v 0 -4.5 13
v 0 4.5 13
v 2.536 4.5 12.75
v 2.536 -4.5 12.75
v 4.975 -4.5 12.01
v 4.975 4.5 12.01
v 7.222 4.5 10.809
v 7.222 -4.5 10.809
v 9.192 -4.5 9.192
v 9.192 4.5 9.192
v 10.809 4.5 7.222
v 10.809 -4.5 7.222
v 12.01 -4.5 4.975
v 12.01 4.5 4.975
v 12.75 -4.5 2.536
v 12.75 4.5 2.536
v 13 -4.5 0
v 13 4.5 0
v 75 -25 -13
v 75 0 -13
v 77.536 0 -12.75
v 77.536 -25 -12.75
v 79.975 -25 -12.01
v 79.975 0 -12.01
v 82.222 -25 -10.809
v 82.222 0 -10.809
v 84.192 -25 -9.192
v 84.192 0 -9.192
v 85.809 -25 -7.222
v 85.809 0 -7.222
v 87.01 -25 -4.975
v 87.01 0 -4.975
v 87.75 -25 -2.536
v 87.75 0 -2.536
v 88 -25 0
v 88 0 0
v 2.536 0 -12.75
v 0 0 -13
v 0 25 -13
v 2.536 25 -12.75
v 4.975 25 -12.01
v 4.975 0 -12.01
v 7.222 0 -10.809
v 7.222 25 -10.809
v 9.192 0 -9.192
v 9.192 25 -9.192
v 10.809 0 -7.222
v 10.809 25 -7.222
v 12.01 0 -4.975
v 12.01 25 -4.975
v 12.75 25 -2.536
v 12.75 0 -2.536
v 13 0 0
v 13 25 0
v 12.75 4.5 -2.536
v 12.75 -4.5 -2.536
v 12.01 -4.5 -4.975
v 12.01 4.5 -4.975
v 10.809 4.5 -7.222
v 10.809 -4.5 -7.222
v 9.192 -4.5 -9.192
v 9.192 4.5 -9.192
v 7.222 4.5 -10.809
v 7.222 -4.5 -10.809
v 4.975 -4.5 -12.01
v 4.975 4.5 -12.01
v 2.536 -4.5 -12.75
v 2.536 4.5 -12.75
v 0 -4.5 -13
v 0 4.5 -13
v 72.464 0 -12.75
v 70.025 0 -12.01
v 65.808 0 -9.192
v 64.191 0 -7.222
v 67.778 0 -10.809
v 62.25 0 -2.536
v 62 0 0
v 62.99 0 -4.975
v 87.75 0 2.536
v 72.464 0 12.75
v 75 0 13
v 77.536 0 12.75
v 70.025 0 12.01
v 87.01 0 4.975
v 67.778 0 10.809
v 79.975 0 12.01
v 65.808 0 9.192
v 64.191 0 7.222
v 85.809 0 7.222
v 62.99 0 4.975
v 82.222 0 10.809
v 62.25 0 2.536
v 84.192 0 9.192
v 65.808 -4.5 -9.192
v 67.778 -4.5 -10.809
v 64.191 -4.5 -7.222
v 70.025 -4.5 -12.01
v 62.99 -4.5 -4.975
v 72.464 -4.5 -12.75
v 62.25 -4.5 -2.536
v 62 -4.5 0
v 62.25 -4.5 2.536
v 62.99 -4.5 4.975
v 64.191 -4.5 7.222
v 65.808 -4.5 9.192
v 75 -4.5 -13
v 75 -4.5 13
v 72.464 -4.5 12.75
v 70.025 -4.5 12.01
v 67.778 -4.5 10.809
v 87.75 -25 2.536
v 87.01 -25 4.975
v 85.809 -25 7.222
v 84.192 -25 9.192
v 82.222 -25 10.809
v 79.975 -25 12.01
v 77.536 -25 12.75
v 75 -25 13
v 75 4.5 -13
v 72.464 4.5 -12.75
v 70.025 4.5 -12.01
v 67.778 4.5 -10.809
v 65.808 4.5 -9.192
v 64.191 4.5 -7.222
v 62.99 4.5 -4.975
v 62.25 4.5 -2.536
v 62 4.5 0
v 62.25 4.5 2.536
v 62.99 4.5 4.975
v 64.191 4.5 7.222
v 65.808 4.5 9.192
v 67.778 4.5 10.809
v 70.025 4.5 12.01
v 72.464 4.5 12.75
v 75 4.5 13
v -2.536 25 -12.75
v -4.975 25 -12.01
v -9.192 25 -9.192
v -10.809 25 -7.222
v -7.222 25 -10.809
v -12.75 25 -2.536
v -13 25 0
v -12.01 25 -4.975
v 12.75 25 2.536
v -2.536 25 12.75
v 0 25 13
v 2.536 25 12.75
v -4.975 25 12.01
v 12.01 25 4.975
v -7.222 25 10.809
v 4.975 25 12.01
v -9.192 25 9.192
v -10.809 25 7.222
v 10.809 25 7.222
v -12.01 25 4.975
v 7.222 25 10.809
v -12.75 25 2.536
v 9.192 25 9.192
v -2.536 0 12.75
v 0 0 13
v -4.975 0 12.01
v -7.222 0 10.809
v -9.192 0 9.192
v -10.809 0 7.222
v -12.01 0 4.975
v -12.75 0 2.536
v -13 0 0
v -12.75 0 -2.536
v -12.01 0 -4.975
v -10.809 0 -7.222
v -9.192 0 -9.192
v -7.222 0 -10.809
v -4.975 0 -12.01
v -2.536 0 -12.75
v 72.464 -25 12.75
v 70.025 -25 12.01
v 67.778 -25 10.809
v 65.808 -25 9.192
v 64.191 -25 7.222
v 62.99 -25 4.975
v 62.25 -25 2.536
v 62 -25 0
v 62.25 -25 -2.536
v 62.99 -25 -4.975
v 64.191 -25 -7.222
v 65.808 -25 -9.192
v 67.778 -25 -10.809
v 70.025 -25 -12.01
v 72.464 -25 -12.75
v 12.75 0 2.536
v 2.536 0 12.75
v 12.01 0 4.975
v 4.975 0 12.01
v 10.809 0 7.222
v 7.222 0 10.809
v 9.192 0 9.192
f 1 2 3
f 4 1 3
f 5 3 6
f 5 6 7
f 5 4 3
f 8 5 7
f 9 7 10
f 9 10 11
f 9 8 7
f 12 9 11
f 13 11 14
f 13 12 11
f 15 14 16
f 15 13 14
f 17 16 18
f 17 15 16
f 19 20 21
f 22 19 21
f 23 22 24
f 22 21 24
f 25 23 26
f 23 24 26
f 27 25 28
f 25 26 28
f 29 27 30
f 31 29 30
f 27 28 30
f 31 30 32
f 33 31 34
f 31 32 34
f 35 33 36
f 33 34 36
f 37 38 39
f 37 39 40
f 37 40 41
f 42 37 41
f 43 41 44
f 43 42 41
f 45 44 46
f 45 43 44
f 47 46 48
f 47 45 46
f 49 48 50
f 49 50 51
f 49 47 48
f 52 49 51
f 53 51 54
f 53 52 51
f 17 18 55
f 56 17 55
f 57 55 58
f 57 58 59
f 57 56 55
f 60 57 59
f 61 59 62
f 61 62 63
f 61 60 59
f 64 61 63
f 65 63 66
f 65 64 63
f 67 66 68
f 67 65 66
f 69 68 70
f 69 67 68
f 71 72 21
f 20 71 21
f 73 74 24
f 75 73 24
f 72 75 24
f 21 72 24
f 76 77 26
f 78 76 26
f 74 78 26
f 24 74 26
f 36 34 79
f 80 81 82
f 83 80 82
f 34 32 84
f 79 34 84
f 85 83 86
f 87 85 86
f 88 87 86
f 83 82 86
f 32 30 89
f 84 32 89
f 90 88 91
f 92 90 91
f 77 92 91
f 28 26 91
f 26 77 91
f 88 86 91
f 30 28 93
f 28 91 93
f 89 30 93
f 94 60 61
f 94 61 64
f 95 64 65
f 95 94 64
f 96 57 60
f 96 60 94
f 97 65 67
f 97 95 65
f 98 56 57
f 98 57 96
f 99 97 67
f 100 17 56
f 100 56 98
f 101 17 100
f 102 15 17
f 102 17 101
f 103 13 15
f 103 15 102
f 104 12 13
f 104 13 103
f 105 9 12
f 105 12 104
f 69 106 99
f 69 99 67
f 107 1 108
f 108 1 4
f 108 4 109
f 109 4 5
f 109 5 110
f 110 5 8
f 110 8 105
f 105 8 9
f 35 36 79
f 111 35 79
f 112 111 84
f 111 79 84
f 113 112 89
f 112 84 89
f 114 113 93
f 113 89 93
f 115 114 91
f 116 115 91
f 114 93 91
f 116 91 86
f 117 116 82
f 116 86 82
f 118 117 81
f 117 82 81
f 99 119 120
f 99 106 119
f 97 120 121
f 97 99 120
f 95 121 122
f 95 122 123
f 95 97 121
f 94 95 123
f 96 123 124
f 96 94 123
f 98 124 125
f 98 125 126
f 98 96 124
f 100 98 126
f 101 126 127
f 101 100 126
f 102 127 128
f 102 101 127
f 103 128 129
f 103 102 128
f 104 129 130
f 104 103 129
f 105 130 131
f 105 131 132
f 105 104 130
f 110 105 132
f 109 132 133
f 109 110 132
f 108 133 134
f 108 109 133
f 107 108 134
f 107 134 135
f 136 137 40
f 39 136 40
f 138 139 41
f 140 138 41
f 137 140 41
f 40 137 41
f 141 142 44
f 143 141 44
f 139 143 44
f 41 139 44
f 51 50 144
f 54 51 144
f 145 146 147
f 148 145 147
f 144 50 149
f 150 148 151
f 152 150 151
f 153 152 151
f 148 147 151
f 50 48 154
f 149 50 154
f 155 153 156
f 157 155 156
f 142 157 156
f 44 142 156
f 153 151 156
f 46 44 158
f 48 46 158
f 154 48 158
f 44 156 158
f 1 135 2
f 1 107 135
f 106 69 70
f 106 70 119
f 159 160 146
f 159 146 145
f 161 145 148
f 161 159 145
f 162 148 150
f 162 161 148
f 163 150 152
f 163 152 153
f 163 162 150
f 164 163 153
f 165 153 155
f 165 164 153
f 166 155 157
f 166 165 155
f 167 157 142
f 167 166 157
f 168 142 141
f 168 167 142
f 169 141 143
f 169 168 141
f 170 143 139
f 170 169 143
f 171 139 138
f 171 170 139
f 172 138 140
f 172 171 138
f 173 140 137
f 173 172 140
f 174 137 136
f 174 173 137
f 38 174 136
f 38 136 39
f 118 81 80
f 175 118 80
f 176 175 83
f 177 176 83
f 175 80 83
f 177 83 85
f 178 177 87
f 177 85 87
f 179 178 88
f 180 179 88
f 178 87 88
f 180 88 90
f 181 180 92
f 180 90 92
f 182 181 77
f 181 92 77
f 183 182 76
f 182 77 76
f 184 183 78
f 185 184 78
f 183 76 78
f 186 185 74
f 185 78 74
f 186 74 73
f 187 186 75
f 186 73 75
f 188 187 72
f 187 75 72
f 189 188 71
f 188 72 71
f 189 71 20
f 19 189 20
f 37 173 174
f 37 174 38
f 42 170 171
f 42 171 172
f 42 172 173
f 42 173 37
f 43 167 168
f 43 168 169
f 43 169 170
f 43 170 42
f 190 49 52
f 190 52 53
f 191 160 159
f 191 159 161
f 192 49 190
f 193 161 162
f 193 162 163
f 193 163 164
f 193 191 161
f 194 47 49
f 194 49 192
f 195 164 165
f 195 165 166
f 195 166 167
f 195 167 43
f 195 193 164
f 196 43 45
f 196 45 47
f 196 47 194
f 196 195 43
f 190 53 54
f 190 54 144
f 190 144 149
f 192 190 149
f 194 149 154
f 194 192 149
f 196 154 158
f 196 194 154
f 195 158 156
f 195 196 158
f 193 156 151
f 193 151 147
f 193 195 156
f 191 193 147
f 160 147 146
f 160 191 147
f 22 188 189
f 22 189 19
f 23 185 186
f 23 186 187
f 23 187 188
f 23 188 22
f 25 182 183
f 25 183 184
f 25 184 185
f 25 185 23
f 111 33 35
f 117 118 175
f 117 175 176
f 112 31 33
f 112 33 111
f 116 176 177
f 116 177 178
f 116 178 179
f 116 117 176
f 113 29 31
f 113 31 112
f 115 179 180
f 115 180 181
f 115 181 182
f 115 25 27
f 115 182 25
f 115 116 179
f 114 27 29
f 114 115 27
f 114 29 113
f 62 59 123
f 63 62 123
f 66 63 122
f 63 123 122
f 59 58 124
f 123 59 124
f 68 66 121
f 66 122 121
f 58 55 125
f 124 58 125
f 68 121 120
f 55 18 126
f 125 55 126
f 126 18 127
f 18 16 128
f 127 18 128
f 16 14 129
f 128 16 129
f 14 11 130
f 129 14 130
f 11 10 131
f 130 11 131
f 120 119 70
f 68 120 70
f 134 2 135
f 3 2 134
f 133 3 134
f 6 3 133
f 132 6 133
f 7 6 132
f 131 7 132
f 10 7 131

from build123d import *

# Parameters (mm, degrees)
F1_DEPTH = 25
F2_DEPTH = 25
F3_DEPTH = 4.5


with BuildPart() as f1:
    # F0 (on Front) → F1 (new body)
    with BuildSketch(Plane.XZ):
        with BuildLine():
            ThreePointArc((0, -13), (9.192388, -9.192388), (13, 0))
            ThreePointArc((13, 0), (9.192388, 9.192388), (0, 13))
            ThreePointArc((0, 13), (-13, 0), (0, -13))
        make_face()
    extrude(amount=-F1_DEPTH)


with BuildPart() as f2:
    # F0 (on Front) → F2 (new body)
    with BuildSketch(Plane.XZ):
        with BuildLine():
            ThreePointArc((88, 0), (84.192388, 9.192388), (75, 13))
            ThreePointArc((75, 13), (62, 0), (75, -13))
            ThreePointArc((75, -13), (84.192388, -9.192388), (88, 0))
        make_face()
    extrude(amount=F2_DEPTH)


with BuildPart() as f3:
    # F0 (on Front) → F3 (new body, symmetric)
    with BuildSketch(Plane.XZ):
        with BuildLine():
            ThreePointArc((0, 13), (9.192388, 9.192388), (13, 0))
            ThreePointArc((13, 0), (9.192388, -9.192388), (0, -13))
            Line((0, -13), (75, -13))
            ThreePointArc((75, -13), (62, 0), (75, 13))
            Line((75, 13), (0, 13))
        make_face()
    extrude(amount=F3_DEPTH, both=True)


solid = Compound([f1.part, f2.part, f3.part])
